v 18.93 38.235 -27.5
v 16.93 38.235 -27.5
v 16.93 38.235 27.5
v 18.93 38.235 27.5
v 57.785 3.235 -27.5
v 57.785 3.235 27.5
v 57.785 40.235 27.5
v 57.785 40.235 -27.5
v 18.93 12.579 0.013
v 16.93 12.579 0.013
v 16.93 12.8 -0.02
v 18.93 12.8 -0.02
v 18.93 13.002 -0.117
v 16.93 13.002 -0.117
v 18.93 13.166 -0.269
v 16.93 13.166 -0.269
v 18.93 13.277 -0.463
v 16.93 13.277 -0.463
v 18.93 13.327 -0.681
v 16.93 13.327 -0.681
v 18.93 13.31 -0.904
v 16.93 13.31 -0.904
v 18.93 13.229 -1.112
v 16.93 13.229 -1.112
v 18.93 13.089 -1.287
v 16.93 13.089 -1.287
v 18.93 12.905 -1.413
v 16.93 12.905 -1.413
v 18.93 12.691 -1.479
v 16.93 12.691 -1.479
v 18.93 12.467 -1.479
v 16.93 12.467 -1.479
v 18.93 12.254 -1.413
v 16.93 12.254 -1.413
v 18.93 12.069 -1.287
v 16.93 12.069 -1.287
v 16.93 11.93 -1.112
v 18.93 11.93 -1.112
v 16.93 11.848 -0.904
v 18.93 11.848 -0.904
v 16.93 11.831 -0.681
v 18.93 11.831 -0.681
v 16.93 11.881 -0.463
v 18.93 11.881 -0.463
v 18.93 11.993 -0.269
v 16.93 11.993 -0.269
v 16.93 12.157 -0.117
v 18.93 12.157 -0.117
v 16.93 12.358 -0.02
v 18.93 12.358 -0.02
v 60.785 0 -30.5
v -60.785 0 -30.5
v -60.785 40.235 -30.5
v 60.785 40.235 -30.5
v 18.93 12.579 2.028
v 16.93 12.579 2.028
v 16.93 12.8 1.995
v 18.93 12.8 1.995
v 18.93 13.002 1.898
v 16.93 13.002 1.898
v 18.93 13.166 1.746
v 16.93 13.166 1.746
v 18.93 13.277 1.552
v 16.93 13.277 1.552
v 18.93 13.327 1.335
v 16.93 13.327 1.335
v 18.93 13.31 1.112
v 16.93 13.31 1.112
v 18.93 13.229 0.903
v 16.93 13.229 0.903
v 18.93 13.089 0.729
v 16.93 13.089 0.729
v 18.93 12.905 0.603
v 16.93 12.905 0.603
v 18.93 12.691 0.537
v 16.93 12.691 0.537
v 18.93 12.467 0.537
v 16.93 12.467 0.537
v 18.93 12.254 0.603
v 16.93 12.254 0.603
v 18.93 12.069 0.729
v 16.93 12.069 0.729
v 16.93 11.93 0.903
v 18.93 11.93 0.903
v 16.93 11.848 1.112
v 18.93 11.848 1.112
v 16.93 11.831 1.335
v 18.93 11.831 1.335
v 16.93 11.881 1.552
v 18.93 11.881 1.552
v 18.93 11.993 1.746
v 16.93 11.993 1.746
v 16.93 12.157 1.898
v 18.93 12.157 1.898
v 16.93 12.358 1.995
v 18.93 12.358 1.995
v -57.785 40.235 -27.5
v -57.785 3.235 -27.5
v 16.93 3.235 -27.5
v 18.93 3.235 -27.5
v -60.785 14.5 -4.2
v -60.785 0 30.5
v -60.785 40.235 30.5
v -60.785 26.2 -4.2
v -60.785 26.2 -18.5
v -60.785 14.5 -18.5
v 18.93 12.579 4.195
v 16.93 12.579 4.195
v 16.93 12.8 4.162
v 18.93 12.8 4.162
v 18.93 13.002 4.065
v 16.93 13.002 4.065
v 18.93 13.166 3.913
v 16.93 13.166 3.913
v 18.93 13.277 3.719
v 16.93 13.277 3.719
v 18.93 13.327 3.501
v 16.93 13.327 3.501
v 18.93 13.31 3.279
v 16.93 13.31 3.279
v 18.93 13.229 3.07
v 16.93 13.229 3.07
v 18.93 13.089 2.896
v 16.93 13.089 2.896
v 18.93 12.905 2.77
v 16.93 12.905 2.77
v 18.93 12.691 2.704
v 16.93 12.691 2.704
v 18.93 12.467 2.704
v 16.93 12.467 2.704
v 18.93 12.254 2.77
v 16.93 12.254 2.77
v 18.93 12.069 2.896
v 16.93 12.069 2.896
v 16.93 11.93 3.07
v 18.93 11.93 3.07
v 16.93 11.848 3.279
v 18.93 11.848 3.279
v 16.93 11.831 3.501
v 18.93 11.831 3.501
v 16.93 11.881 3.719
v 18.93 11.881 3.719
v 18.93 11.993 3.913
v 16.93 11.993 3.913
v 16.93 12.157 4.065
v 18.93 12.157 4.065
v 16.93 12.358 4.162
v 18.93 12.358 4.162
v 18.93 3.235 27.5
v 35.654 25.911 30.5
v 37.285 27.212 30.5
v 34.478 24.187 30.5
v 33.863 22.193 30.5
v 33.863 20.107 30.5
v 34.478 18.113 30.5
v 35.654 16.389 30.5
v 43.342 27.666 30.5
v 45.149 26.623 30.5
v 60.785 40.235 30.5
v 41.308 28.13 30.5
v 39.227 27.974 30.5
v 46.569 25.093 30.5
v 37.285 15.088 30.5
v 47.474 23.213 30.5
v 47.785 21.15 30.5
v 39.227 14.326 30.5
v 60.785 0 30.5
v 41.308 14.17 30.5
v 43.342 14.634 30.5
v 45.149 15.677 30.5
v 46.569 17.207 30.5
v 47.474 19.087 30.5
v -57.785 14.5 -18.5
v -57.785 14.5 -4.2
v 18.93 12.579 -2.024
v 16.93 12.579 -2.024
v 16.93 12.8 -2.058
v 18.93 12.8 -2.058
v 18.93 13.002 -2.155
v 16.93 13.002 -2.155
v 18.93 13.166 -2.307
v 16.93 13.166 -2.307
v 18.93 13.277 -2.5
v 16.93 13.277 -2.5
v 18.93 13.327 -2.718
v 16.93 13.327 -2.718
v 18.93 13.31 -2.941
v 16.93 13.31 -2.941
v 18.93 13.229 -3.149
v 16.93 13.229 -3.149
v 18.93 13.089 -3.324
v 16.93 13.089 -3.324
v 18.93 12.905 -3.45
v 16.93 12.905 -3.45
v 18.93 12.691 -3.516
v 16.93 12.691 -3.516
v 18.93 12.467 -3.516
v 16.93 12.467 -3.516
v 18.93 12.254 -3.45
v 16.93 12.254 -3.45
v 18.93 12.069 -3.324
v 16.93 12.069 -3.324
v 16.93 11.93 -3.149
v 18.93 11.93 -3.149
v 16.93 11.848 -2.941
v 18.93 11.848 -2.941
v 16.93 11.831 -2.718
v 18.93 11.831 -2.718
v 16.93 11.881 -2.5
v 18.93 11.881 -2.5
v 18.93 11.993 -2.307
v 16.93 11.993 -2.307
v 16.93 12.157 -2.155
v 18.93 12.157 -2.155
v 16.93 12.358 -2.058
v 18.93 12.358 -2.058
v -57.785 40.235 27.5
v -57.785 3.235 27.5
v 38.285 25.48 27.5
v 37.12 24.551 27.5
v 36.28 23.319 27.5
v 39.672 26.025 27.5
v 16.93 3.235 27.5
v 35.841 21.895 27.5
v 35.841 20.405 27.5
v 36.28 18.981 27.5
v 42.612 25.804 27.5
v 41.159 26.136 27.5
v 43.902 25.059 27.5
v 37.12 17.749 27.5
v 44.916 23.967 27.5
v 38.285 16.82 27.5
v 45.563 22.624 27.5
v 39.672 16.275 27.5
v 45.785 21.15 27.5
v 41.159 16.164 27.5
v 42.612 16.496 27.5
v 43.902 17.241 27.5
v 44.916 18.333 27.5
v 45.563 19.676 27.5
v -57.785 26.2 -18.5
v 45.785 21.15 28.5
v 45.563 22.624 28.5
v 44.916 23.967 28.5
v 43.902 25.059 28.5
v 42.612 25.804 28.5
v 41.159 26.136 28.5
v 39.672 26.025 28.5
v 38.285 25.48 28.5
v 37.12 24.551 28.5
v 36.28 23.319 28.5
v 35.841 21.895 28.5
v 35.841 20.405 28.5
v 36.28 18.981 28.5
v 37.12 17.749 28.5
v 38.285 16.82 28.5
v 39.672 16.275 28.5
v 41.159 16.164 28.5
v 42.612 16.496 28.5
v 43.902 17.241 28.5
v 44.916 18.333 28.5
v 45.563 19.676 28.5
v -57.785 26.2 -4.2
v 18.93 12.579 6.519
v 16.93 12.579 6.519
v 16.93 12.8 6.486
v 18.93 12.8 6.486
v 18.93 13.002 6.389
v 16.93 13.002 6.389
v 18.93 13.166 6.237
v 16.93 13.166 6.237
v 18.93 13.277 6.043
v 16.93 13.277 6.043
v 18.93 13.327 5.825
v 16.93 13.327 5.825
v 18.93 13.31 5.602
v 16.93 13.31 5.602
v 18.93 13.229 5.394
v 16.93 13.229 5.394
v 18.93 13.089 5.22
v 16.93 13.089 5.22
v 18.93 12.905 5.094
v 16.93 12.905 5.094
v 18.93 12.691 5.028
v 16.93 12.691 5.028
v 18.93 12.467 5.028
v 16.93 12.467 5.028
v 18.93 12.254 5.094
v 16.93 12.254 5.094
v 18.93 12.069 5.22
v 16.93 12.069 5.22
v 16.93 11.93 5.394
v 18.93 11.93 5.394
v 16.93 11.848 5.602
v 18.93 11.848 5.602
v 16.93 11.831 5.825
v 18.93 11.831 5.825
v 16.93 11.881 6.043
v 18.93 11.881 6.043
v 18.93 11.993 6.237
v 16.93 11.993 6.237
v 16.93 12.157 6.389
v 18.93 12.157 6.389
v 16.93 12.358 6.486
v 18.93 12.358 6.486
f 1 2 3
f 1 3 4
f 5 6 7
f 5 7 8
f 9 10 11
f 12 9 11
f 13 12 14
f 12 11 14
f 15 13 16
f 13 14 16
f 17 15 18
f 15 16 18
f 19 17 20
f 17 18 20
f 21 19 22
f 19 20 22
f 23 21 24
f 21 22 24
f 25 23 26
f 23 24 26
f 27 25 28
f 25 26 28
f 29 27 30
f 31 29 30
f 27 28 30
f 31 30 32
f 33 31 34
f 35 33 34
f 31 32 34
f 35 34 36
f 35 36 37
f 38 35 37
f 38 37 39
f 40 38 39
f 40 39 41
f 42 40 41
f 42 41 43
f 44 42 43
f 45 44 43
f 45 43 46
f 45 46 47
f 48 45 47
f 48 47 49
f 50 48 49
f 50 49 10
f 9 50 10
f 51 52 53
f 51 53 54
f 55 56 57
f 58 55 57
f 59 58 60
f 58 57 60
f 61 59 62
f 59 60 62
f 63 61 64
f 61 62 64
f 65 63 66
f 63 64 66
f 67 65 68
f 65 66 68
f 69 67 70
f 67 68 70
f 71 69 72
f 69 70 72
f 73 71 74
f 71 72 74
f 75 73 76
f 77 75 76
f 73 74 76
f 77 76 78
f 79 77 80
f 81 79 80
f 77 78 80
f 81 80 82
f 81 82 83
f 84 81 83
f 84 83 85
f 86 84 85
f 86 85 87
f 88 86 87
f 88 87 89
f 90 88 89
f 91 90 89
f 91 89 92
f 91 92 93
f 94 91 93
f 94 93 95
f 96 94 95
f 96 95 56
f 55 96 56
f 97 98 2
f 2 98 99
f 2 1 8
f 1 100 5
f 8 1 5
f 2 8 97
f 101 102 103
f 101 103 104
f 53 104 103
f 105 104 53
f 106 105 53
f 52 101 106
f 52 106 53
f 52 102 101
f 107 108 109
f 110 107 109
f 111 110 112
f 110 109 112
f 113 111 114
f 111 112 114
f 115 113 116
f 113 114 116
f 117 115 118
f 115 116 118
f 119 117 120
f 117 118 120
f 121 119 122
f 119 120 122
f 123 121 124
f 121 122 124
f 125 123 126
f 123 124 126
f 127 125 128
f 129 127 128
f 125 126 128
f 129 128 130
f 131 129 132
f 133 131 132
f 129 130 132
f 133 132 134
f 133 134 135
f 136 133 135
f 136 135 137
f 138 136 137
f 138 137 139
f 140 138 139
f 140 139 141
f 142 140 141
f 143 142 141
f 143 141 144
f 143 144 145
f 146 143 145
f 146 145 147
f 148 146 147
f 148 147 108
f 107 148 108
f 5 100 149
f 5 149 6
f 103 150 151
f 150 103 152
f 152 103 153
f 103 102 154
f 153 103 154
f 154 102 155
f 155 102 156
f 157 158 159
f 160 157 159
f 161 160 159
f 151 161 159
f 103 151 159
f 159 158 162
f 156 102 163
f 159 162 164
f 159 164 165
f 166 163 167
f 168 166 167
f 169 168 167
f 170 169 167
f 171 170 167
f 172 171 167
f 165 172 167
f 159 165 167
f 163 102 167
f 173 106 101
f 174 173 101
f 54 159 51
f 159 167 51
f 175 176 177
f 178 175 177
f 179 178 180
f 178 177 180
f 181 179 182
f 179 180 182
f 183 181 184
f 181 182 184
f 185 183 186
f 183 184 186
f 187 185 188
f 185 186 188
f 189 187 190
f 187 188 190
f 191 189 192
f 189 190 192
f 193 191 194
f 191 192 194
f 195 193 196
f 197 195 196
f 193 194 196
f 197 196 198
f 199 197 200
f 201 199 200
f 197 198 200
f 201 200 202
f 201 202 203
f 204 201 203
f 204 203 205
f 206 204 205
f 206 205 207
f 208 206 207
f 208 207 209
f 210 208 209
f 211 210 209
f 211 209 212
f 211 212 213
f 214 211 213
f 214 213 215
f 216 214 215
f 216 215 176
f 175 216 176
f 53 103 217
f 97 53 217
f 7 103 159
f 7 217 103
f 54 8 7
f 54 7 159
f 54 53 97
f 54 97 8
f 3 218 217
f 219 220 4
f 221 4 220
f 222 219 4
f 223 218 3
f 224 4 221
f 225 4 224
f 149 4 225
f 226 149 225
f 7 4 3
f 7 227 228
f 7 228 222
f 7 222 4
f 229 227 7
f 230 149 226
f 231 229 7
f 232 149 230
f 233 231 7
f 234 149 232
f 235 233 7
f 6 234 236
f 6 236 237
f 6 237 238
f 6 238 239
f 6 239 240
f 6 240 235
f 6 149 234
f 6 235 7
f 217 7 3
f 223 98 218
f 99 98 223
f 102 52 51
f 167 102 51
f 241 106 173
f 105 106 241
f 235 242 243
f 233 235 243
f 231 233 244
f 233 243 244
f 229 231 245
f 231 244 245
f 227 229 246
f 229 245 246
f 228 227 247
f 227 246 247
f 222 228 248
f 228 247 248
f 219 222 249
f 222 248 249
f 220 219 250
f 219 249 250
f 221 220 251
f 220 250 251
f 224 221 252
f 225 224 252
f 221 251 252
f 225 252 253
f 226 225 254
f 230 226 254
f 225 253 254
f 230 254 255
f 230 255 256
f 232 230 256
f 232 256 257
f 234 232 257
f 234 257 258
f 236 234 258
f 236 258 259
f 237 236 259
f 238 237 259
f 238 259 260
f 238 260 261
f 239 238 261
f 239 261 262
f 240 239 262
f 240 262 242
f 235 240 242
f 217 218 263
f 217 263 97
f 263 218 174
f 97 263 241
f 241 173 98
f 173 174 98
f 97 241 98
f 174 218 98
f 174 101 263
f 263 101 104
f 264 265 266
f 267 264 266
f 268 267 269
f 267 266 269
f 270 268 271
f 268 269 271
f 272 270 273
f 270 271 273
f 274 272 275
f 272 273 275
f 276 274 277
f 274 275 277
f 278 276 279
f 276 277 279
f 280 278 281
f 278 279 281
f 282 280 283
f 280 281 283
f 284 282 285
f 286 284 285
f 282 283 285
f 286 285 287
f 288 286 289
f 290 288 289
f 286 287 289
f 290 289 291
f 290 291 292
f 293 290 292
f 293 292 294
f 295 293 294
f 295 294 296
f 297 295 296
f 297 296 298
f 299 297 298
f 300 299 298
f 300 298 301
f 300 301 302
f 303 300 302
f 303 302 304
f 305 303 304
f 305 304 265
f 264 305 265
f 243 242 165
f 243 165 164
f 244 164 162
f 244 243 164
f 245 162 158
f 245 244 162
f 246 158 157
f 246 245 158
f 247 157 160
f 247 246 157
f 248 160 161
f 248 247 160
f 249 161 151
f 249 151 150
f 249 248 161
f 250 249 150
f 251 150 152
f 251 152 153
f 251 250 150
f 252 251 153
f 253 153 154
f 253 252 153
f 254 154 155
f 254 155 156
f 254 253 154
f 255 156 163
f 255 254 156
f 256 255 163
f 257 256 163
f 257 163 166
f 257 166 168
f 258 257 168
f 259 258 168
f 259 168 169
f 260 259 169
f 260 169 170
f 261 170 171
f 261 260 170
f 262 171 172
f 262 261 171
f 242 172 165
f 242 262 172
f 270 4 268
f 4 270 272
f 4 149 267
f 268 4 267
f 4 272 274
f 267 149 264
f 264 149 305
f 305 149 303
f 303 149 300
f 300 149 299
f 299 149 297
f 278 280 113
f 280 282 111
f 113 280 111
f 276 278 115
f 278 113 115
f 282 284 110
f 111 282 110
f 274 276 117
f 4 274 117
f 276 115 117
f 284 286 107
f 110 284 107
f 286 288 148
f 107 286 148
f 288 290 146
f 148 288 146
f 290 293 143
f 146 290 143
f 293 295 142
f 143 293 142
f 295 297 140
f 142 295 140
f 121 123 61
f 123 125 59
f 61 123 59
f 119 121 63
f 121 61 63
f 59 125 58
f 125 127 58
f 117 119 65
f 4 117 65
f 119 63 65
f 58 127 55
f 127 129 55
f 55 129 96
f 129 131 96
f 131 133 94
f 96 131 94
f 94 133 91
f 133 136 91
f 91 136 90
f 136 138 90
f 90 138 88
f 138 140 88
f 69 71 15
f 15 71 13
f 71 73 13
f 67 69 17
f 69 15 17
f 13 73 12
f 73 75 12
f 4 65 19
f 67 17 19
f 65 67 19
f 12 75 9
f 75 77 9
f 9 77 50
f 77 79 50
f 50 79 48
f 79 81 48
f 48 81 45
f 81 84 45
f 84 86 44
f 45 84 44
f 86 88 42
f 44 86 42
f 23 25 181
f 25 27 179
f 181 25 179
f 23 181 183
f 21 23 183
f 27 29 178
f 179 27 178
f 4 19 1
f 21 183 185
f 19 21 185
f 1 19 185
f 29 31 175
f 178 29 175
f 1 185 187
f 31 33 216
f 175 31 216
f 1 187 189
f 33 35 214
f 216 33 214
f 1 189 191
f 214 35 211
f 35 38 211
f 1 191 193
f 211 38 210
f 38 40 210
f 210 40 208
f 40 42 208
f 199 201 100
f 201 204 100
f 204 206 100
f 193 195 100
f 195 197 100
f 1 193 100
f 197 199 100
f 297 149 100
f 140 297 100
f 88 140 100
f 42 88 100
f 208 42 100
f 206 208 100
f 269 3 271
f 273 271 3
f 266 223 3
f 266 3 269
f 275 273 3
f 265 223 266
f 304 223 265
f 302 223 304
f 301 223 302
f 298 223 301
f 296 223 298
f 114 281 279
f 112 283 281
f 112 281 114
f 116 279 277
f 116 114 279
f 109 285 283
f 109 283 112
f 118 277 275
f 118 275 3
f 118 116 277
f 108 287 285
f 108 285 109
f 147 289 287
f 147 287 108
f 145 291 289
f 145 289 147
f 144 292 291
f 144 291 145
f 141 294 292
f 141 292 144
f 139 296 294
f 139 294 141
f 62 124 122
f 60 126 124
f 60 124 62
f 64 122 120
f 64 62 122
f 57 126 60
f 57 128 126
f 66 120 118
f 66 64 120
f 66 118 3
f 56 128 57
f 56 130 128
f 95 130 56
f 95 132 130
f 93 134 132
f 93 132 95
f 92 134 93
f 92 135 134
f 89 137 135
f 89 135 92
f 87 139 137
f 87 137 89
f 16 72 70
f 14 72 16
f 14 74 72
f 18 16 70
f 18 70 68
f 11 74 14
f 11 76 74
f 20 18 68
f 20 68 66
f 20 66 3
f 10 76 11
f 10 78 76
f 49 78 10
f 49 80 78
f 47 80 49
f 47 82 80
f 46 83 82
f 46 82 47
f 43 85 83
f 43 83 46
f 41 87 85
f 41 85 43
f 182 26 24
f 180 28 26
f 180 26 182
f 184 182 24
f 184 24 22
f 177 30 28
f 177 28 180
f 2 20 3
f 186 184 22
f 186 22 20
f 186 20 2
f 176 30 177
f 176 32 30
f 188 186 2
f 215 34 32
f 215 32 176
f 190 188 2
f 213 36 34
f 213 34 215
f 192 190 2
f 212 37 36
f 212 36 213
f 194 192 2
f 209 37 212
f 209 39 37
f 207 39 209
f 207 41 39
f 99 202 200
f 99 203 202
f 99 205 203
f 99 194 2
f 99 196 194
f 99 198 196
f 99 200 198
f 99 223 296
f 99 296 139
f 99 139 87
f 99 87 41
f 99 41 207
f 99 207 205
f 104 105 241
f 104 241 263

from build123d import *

# Parameters (mm, degrees)
SKETCH1_W               = 121.57
SKETCH1_H               = 61
BOSS_EXTRUDE1_DEPTH     = 3.235369433
SKETCH2_W               = 121.57
SKETCH2_H               = 61
SKETCH2_W_2             = 115.57
SKETCH2_H_2             = 55
BOSS_EXTRUDE2_DEPTH     = 37
CUT_EXTRUDE1_REACH      = 123.57
SKETCH3_W               = 14.3
SKETCH3_H               = 11.7
SKETCH5_W               = 2
SKETCH5_H               = 55
BOSS_EXTRUDE3_DEPTH     = 35
SKETCH7_R               = 5
CUT_EXTRUDE3_DEPTH      = 20
CHAMFER10_SIZE          = 2
SKETCH8_R               = 0.75
CUT_EXTRUDE4_DEPTH      = 11
CUT_EXTRUDE4_DEPTH_BACK = 17


with BuildPart() as part:
    # Sketch1 → Boss-Extrude1 (new body)
    with BuildSketch(Plane(origin=(0, 0, 0), x_dir=(1, 0, 0), z_dir=(0, 1, 0))):
        Rectangle(SKETCH1_W, SKETCH1_H)
    extrude(amount=BOSS_EXTRUDE1_DEPTH)

    # Sketch2 → Boss-Extrude2 (add)
    with BuildSketch(Plane(origin=(0, 3.235369433, 0), x_dir=(1, 0, 0), z_dir=(0, 1, 0))):
        Rectangle(SKETCH2_W, SKETCH2_H)
        Rectangle(SKETCH2_W_2, SKETCH2_H_2, mode=Mode.SUBTRACT)
    extrude(amount=BOSS_EXTRUDE2_DEPTH)

    # Sketch3 → Cut-Extrude1 (cut, up to next)
    with BuildSketch(Plane.ZY.offset(60.785), mode=Mode.PRIVATE) as cut_extrude1_sk1:
        with Locations((-11.35, 20.35)):
            Rectangle(SKETCH3_W, SKETCH3_H)
    cut_extrude1_tool1 = extrude(cut_extrude1_sk1.sketch, amount=-CUT_EXTRUDE1_REACH, mode=Mode.PRIVATE) & part.part
    add(cut_extrude1_tool1.solids().sort_by_distance((-60.785, 20.35, -11.35))[0], mode=Mode.SUBTRACT)

    # Sketch5 → Boss-Extrude3 (add)
    with BuildSketch(Plane(origin=(0, 3.235369433, 0), x_dir=(1, 0, 0), z_dir=(0, 1, 0))):
        with Locations((17.93, 0)):
            Rectangle(SKETCH5_W, SKETCH5_H)
    extrude(amount=BOSS_EXTRUDE3_DEPTH)

    # Sketch7 → Cut-Extrude3 (cut)
    with BuildSketch(Plane.XY.offset(30.5)):
        with Locations((40.785, 21.15)):
            Circle(SKETCH7_R)
    extrude(amount=-CUT_EXTRUDE3_DEPTH, mode=Mode.SUBTRACT)

    # Chamfer10
    chamfer10_edges = [part.edges().sort_by_distance(p)[0] for p in [
        (35.785, 21.15, 30.5),
    ]]
    chamfer(chamfer10_edges, length=CHAMFER10_SIZE)

    # Sketch8 → Cut-Extrude4 (cut, two sides)
    with BuildSketch(Plane.ZY.offset(-16.93)) as cut_extrude4_sk:
        with Locations((-0.737087906, 12.579188257)):
            Circle(SKETCH8_R)
        with Locations((1.278476701, 12.579188257)):
            Circle(SKETCH8_R)
        with Locations((3.44541986, 12.579188257)):
            Circle(SKETCH8_R)
        with Locations((5.769363075, 12.579188257)):
            Circle(SKETCH8_R)
        with Locations((-2.774299402, 12.579188257)):
            Circle(SKETCH8_R)
    extrude(amount=CUT_EXTRUDE4_DEPTH, mode=Mode.SUBTRACT)
    extrude(cut_extrude4_sk.sketch, amount=-CUT_EXTRUDE4_DEPTH_BACK, mode=Mode.SUBTRACT)


solid = part.part
